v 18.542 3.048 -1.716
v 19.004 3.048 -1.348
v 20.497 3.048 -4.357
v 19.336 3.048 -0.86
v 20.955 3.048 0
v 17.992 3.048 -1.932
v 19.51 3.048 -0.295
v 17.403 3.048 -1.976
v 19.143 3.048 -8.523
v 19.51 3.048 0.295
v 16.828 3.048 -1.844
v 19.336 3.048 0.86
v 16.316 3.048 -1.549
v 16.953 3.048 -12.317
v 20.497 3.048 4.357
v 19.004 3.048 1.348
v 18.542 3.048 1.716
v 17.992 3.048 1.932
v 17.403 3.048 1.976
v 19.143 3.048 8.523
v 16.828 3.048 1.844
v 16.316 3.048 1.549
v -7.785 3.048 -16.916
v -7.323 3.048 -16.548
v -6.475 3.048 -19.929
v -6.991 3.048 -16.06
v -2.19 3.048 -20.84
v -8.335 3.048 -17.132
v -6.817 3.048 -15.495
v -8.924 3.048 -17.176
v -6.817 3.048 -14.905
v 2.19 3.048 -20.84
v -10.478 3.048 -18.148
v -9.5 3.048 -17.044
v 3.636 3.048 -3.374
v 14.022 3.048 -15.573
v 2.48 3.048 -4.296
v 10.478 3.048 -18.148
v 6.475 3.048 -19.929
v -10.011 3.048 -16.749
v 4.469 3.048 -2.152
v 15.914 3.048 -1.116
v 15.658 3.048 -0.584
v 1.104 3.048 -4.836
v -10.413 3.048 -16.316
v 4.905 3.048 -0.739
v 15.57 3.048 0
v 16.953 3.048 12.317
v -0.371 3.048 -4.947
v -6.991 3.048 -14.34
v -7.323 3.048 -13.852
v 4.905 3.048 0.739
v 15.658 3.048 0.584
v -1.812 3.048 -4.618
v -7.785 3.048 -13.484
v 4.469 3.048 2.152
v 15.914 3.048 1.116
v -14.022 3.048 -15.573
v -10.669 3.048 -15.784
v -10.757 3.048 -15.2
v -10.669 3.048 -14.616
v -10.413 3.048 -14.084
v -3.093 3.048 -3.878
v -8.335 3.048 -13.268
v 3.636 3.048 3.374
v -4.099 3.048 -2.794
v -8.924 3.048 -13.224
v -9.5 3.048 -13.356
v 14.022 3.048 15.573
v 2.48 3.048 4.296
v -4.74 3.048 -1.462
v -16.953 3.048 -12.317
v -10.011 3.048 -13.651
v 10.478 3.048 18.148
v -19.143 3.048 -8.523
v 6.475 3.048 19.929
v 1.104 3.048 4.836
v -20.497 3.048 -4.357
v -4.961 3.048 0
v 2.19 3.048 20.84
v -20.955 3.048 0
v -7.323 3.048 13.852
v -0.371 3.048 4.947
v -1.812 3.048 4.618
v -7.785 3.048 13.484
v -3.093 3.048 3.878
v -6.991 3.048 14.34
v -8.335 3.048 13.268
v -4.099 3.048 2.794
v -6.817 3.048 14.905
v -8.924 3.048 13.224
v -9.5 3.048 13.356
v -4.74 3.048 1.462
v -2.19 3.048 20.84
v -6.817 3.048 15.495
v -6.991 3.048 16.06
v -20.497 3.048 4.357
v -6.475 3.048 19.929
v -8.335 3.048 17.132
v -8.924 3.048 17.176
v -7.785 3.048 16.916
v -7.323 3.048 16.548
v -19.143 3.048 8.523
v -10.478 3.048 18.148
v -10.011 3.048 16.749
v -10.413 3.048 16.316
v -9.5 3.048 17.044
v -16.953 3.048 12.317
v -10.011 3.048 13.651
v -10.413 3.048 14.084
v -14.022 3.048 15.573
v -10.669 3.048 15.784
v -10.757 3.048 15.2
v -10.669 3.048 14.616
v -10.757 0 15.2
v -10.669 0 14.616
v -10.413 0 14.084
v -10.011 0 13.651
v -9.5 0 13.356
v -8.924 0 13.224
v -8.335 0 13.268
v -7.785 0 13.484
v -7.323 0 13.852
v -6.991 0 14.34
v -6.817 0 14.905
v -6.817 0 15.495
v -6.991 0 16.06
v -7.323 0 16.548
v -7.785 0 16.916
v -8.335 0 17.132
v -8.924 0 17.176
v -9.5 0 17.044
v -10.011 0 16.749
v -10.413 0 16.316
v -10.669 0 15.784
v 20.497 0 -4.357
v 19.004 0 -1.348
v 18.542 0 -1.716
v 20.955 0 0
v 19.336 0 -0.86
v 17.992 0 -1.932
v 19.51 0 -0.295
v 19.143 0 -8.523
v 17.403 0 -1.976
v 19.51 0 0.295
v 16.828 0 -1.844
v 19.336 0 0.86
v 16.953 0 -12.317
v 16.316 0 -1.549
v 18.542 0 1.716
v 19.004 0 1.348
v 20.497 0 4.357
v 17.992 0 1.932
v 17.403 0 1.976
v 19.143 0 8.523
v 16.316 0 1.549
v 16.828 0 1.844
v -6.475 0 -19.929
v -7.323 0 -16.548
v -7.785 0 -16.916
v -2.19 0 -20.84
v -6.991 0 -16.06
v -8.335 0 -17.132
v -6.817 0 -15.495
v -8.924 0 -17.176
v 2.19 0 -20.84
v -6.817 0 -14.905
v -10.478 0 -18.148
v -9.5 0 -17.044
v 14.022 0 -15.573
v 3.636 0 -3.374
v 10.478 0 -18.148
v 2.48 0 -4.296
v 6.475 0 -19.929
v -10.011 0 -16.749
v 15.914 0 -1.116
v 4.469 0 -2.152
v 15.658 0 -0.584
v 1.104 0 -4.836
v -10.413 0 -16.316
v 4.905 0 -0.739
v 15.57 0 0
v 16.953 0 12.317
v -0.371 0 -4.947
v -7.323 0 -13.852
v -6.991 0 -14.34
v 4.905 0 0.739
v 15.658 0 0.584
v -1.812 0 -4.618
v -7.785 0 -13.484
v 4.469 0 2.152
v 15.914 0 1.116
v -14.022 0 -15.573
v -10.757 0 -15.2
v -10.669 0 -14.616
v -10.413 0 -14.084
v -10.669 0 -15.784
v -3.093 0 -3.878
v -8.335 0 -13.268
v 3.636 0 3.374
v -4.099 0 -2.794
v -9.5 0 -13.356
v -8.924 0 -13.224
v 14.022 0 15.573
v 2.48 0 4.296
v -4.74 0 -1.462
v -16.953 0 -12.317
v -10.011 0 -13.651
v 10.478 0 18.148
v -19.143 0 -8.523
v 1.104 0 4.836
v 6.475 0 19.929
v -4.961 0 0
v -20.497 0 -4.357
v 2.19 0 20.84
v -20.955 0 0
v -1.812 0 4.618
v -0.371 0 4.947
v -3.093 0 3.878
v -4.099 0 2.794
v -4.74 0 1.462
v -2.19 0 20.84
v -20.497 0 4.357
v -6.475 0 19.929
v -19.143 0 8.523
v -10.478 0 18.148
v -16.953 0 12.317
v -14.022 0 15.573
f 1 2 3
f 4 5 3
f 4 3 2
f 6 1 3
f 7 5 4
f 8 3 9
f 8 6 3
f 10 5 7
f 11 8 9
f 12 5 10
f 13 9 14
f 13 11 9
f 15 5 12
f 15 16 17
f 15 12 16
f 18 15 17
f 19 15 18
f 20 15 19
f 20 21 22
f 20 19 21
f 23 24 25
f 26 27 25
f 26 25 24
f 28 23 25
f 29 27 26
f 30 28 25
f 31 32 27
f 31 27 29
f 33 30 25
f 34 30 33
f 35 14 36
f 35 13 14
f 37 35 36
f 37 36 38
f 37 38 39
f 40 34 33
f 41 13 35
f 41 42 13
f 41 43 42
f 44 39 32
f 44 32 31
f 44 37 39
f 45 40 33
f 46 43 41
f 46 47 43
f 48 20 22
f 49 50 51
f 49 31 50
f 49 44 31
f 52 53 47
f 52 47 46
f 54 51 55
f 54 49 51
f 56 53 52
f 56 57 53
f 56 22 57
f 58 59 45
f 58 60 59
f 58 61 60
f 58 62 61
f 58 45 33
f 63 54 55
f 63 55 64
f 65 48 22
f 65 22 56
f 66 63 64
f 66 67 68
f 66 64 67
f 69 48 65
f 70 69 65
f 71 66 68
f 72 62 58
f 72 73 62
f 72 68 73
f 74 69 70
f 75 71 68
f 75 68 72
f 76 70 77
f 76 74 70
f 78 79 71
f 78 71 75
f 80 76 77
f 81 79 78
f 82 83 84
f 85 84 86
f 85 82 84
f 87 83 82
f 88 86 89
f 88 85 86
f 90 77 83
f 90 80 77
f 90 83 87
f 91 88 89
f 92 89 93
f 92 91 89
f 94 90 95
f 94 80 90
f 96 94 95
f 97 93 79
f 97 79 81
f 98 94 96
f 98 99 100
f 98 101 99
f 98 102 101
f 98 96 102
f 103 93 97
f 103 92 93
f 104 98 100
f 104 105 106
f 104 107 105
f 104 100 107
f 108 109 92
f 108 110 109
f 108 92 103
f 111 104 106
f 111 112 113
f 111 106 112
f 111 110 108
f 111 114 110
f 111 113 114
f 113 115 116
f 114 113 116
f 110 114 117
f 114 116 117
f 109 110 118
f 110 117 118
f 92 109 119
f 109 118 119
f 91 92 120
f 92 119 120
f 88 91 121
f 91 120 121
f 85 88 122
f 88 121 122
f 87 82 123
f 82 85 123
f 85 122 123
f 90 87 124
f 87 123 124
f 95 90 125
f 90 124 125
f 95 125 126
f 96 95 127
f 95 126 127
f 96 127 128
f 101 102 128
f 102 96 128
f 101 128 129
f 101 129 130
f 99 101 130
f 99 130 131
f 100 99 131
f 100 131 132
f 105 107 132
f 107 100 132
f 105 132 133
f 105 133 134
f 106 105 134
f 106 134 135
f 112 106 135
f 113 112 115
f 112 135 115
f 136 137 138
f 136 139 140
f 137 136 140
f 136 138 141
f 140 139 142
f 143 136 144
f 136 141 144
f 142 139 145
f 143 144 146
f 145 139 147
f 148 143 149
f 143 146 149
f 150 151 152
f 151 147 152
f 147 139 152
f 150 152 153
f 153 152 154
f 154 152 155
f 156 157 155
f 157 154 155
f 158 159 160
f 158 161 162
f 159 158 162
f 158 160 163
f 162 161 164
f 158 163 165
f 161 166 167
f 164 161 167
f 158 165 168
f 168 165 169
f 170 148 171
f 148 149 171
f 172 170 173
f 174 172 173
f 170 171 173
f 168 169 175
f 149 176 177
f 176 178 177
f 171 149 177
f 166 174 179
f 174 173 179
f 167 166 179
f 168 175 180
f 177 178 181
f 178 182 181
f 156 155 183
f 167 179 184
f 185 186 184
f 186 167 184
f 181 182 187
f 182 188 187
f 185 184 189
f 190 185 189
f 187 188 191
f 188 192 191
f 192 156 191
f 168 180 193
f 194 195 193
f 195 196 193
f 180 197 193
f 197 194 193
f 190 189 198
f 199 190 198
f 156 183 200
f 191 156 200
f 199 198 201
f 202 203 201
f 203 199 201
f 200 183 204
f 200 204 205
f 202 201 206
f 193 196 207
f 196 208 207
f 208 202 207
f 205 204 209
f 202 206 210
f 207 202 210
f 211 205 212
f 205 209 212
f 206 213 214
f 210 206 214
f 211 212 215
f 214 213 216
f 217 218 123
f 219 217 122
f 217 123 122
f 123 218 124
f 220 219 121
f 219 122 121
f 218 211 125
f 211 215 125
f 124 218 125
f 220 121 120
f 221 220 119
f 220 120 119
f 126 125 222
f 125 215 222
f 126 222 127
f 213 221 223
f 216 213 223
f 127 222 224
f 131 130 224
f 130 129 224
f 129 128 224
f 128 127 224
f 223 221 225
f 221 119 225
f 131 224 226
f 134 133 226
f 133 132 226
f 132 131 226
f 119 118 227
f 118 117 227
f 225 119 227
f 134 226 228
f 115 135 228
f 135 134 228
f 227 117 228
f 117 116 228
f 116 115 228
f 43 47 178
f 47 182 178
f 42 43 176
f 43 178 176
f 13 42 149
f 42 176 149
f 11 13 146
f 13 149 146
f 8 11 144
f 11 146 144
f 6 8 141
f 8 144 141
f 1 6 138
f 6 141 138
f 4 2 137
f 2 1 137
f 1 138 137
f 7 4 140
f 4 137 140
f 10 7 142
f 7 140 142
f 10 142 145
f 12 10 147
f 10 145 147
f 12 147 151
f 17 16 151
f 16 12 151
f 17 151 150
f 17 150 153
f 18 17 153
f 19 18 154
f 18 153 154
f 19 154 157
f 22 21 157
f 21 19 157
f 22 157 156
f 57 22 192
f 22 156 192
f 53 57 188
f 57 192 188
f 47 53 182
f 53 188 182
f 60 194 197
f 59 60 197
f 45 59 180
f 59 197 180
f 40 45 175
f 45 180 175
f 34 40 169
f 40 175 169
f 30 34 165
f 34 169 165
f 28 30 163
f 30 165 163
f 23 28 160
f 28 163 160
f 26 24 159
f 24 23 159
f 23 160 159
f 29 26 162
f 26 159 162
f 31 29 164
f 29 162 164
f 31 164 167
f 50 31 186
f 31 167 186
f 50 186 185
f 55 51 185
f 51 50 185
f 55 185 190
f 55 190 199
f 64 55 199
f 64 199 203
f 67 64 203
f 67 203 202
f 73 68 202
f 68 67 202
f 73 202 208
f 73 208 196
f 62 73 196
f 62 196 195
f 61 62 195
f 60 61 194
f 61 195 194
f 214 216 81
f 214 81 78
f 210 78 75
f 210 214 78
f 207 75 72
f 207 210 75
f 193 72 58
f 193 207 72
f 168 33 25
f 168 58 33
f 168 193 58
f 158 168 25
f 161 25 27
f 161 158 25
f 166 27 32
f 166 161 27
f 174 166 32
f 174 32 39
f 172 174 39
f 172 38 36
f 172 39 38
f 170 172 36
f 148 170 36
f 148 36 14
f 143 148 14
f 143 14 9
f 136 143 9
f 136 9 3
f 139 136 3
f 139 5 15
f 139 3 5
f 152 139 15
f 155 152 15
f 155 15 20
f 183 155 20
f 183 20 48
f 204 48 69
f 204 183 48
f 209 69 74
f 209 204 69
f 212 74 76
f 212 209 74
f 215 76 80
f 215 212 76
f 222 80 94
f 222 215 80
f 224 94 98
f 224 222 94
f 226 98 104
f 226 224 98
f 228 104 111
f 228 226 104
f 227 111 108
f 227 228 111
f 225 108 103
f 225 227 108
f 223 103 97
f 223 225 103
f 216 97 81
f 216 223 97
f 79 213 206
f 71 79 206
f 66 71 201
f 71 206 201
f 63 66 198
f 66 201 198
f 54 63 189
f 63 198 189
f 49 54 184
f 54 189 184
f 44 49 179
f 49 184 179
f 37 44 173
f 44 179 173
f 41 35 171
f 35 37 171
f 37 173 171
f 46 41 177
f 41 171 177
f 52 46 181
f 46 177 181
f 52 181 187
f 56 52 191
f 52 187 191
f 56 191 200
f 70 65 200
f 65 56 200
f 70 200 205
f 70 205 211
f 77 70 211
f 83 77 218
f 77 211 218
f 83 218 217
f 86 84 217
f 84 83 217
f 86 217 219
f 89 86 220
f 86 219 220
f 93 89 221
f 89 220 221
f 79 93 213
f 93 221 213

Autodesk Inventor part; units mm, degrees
ref_plane "YZ Plane" through (0, 0, 0) normal (1, 0, 0) x (0, 1, 0)
ref_plane "XZ Plane" through (0, 0, 0) normal (0, 1, 0) x (-1, 0, 0)
ref_plane "XY Plane" through (0, 0, 0) normal (0, 0, 1) x (1, 0, 0)
sketch "Sketch1" plane through (0, 0, 0) normal (0, 1, 0) x (-1, 0, 0)
  circle A0 centre (0, 0) radius 20.955
  circle A1 centre (0, 0) radius 4.9606
  circle A2 centre (-17.5514, 0) radius 1.9812
  circle A3 centre (8.7757, -15.2) radius 1.9812
  circle A4 centre (8.7757, 15.2) radius 1.9812
  dimension "d0" = 41.91
  dimension "d1" = 9.9212
  dimension "d2" = 3.9624
  dimension "d5" = 360
extrude "Plate1" add sketch "Sketch1" along normal blind 3.048
equation "\"d7\" = Thickness"
equation "\"BendRadius\" = Thickness"
equation "\"BendReliefWidth\" = Thickness"
equation "\"BendReliefDepth\" = 0.5 * Thickness"
equation "\"CornerReliefSize\" = 4 * Thickness"
equation "\"MinimumRemnant\" = 2 * Thickness"
equation "\"TransitionRadius\" = BendRadius"
equation "\"JacobiRadiusSize\" = BendRadius"
equation "\"GapSize\" = Thickness"
equation "\"Thickness\" = 3.048"
properties part number "disk-sheet-b"
